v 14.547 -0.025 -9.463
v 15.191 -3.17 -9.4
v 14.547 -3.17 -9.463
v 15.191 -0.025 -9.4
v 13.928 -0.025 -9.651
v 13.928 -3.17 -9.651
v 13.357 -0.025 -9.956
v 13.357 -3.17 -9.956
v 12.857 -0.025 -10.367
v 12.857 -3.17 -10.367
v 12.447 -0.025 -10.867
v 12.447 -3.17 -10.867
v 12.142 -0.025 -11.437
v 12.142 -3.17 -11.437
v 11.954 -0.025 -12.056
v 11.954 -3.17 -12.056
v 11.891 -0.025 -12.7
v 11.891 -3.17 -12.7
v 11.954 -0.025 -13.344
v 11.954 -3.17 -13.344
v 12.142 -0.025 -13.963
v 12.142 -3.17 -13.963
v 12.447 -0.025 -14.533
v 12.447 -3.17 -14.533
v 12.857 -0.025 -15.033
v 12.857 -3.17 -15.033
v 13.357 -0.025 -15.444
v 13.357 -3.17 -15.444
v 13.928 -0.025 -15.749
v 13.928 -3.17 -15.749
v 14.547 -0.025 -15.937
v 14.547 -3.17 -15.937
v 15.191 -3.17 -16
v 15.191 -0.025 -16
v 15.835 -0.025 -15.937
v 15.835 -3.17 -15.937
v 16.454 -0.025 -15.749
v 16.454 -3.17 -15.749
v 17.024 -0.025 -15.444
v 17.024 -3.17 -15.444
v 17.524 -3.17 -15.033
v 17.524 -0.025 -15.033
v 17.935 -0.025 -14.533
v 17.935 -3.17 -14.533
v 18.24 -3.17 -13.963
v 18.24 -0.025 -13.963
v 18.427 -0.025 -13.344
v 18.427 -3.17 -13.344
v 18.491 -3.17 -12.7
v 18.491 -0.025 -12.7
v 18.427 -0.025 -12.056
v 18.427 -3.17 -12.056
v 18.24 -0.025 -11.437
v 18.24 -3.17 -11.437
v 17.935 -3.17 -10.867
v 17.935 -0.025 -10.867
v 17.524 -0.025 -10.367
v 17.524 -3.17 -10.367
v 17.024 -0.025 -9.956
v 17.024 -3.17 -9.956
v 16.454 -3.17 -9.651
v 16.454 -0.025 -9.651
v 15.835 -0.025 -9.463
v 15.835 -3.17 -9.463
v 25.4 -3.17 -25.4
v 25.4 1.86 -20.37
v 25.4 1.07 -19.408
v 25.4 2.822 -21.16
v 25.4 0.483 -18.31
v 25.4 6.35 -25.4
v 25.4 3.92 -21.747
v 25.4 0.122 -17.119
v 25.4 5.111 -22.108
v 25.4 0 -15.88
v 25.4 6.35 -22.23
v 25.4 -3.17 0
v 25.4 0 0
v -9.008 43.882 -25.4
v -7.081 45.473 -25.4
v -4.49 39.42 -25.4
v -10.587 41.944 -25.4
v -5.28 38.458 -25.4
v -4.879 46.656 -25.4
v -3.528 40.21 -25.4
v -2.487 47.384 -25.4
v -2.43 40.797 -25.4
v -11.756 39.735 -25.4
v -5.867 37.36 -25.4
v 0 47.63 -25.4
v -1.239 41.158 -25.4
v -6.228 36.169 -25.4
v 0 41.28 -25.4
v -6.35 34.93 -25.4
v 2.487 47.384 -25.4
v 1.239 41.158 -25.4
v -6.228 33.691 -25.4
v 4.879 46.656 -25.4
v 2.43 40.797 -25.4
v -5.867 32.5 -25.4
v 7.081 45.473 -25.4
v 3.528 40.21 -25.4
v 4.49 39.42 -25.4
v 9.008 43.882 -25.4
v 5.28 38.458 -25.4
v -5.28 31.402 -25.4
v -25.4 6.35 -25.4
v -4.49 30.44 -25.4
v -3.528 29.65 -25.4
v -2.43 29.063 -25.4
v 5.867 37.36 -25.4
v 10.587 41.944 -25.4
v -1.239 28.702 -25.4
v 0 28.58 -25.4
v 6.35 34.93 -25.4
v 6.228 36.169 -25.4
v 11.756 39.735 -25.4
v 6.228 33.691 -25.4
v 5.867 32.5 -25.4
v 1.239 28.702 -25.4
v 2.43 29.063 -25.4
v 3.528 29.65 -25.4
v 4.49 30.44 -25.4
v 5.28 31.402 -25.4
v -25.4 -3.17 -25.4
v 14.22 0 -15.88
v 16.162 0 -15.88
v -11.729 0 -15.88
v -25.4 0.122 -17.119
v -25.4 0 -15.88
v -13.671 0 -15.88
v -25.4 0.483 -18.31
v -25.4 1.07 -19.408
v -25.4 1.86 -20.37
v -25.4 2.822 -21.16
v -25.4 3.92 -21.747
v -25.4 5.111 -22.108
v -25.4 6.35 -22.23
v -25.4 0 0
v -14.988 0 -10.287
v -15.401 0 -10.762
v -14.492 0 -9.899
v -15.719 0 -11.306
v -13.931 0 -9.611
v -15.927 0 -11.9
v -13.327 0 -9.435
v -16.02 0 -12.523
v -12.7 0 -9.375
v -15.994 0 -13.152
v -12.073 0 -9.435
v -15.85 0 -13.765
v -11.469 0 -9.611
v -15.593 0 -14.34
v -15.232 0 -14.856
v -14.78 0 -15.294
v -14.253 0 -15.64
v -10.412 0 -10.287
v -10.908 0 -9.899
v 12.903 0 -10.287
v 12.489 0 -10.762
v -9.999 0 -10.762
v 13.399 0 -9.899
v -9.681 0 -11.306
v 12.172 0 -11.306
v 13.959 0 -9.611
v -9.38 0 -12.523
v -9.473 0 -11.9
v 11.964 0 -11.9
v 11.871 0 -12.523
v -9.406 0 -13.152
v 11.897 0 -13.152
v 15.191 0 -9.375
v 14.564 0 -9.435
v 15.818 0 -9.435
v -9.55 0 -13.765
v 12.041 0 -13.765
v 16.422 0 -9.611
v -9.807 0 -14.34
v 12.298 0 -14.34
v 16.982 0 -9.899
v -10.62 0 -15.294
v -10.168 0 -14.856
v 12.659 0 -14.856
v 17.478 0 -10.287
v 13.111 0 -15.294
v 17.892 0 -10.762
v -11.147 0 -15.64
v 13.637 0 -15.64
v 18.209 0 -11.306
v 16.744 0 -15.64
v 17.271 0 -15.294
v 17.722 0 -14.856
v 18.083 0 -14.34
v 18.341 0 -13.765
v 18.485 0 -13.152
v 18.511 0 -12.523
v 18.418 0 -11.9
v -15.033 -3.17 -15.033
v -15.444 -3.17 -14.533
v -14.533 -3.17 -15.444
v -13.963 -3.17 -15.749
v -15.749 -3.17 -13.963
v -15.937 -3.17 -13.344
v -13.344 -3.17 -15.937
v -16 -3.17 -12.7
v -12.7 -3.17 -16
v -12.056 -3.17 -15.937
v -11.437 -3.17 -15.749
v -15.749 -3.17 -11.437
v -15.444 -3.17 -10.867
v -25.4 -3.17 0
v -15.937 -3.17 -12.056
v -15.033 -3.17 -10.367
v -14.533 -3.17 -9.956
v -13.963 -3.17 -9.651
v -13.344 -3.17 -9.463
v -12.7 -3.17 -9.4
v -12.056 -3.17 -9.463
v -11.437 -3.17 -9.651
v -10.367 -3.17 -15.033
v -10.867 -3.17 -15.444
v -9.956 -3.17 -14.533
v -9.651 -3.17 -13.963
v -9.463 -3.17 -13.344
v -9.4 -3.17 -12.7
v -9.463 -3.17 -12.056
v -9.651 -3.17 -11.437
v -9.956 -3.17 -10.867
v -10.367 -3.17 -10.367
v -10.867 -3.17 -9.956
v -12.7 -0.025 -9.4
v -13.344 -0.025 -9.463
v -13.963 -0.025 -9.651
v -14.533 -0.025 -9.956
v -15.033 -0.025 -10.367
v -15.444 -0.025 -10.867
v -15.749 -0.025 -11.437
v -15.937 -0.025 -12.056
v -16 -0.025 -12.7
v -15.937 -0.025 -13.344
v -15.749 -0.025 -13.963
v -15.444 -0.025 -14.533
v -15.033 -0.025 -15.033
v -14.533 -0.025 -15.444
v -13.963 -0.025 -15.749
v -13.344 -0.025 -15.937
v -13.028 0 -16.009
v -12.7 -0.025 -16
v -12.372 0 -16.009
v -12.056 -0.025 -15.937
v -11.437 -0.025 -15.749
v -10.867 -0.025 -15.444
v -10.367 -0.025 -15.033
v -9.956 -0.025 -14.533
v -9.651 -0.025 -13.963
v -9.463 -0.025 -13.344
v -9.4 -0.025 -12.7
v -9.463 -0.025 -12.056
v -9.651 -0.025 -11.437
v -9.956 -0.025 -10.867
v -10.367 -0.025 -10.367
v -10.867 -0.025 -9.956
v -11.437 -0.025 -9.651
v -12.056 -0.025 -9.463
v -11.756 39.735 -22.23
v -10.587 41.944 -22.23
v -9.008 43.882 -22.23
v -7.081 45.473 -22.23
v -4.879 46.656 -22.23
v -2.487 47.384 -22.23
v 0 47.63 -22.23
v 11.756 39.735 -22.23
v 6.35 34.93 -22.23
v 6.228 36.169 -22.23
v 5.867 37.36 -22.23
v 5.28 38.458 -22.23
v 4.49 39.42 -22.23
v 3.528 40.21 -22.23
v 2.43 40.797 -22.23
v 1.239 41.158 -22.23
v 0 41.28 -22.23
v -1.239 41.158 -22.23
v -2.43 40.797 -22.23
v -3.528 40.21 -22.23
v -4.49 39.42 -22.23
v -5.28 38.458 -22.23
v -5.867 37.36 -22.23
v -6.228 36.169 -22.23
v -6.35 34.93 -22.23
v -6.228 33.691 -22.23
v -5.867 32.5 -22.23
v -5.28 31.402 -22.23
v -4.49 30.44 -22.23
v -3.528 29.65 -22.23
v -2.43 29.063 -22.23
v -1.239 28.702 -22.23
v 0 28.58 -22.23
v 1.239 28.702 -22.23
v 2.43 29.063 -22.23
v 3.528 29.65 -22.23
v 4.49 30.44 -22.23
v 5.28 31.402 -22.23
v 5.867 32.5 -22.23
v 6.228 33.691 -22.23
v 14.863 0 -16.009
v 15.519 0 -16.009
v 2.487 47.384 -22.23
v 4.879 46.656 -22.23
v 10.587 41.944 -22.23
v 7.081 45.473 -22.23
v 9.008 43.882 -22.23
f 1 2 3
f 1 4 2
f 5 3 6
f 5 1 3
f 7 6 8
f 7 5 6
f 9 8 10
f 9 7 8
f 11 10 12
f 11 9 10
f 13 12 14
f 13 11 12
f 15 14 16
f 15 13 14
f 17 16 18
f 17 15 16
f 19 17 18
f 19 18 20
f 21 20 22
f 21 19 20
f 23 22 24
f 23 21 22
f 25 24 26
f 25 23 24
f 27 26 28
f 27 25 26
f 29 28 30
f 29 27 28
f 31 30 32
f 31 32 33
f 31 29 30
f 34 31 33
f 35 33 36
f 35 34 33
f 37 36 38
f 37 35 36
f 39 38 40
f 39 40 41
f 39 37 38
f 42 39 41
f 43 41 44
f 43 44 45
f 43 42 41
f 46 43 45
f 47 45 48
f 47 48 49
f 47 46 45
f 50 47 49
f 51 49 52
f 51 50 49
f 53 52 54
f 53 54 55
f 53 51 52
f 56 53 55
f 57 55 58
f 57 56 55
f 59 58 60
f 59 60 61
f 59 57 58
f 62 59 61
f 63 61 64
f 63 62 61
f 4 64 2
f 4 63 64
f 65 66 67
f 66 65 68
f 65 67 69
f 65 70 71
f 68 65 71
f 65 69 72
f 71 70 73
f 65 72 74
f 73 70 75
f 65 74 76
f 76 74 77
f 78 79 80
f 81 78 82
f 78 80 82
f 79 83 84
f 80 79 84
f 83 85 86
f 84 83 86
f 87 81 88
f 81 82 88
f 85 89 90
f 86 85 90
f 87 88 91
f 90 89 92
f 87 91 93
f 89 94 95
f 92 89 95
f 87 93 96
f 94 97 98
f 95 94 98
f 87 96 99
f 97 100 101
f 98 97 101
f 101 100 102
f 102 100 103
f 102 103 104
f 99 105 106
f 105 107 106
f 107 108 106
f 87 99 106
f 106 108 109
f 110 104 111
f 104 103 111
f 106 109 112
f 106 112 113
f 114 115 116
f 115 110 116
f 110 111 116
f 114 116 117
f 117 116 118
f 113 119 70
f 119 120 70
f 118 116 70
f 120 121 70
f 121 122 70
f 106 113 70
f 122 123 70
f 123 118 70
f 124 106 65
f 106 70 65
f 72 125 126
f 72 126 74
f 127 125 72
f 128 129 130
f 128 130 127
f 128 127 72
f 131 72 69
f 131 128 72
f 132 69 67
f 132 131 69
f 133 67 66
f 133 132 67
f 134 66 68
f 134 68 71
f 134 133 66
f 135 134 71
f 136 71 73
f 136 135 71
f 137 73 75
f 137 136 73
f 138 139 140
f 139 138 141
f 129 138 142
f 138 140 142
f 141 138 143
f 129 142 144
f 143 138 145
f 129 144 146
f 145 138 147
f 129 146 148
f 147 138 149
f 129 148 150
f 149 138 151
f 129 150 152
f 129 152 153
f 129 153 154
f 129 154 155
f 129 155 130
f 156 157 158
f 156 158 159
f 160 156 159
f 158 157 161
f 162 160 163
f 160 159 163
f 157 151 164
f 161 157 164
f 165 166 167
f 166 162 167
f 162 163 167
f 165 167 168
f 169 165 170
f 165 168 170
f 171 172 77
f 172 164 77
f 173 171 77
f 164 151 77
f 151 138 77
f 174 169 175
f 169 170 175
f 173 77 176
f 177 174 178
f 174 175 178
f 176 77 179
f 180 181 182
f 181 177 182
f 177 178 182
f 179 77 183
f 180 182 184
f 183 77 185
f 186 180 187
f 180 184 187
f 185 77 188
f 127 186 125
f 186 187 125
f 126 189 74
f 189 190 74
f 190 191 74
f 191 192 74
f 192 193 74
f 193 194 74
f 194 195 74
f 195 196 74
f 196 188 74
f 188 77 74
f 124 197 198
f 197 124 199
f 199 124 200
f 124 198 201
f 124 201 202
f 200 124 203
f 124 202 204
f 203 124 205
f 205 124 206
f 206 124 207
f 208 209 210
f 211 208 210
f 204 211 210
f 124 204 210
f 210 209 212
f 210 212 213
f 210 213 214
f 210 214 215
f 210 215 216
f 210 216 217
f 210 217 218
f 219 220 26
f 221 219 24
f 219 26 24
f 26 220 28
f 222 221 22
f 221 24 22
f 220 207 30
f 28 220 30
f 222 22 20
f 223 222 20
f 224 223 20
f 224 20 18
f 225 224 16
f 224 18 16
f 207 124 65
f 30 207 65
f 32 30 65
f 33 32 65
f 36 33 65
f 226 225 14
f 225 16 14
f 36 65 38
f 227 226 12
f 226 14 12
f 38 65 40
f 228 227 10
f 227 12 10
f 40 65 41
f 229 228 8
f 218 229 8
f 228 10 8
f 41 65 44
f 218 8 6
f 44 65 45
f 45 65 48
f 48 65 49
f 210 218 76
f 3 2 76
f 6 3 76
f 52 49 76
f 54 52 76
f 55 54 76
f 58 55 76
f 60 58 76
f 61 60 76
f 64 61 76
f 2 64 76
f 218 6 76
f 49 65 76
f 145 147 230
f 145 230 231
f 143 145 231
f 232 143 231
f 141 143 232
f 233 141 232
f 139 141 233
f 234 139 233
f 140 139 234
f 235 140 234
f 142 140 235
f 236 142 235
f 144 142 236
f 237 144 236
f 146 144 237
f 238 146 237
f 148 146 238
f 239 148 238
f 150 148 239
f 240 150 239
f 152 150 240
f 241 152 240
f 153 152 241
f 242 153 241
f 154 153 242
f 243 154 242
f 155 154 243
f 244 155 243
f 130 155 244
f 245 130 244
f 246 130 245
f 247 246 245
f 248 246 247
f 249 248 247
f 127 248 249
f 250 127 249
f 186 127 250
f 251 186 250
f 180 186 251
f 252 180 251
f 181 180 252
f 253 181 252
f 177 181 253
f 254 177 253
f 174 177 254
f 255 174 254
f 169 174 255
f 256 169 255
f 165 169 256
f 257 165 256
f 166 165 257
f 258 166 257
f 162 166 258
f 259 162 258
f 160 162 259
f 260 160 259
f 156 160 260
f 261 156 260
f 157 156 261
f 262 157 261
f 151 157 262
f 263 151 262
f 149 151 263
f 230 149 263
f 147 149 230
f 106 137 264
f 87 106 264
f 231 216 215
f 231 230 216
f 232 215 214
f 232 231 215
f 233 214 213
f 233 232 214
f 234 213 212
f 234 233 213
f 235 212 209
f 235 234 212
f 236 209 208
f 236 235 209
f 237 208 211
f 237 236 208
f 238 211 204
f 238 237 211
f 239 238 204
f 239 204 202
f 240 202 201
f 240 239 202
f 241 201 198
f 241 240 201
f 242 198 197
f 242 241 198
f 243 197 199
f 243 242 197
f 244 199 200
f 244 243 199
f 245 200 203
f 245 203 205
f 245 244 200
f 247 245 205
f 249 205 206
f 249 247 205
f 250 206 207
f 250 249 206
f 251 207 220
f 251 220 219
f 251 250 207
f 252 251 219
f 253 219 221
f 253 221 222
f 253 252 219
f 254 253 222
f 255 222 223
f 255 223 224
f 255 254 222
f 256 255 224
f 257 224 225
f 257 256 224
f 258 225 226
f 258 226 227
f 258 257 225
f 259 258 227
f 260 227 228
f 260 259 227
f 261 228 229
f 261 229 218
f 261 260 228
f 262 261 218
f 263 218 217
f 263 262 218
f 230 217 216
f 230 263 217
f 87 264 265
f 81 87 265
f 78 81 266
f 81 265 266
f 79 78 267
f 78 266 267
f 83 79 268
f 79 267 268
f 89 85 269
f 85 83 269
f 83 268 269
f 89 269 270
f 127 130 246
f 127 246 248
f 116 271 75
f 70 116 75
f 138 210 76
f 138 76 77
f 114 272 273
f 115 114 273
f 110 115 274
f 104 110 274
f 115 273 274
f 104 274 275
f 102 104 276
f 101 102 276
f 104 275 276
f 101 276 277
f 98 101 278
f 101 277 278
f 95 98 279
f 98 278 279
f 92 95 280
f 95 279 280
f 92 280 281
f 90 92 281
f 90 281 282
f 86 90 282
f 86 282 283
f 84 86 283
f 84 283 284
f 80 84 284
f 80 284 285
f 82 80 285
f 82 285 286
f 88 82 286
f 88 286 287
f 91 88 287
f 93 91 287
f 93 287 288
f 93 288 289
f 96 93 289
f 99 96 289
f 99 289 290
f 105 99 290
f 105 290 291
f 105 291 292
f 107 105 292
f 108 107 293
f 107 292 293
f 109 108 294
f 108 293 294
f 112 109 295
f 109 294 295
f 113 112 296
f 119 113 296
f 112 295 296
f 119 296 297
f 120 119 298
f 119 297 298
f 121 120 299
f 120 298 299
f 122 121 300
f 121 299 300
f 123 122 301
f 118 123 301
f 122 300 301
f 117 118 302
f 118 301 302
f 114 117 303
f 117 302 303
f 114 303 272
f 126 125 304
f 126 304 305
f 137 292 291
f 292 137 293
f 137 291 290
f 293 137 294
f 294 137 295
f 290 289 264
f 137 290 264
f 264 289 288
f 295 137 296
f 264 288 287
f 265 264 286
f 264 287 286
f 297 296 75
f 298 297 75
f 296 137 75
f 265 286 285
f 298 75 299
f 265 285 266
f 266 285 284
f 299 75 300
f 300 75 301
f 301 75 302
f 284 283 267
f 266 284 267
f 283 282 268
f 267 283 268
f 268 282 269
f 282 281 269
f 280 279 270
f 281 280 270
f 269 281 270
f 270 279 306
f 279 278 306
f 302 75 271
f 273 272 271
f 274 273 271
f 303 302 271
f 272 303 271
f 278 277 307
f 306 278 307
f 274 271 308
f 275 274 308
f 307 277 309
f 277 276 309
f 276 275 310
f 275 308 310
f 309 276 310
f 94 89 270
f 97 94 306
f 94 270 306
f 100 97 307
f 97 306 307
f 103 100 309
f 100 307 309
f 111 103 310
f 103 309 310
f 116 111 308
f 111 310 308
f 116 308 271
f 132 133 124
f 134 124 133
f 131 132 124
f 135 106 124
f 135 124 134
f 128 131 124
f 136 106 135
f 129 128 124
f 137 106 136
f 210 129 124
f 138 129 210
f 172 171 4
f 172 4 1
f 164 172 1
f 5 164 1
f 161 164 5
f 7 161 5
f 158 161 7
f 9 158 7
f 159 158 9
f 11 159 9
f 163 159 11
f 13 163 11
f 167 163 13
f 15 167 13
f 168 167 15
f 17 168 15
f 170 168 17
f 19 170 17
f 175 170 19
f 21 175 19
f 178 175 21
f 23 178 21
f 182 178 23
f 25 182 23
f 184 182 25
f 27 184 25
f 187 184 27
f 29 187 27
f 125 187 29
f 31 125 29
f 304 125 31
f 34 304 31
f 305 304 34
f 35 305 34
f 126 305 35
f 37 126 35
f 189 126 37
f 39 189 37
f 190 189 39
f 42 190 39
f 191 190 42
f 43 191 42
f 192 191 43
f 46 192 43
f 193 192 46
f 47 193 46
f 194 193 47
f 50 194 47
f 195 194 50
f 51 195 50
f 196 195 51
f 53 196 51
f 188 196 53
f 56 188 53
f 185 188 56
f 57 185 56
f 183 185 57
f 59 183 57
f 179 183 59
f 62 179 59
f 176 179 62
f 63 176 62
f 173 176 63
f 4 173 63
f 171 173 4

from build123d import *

# Parameters (mm, degrees)
BOSS_EXTRUDE1_DEPTH           = 25.4
FILLET1_R                     = 6.35
M6_CLEARANCE_HOLE1_AT_2_COUNT = 2
M6_CLEARANCE_HOLE1_AT_2_PITCH = 27.890807904
SKETCH4_R                     = 6.35
CUT_EXTRUDE1_DEPTH            = 59.37764812


with BuildPart() as part:
    # Sketch1 → Boss-Extrude1 (new, symmetric)
    with BuildSketch(Plane(origin=(0, 0, 0), x_dir=(0, 0, -1), z_dir=(1, 0, 0))):
        Polygon((0, 0), (22.23, 0), (22.23, 47.63), (25.4, 47.63), (25.4, -3.17), (0, -3.17), align=None)
    extrude(amount=BOSS_EXTRUDE1_DEPTH, both=True)

    # Fillet1
    fillet1_edges = [part.edges().sort_by_distance(p)[0] for p in [
        (0, 0, -22.23),
    ]]
    fillet(fillet1_edges, radius=FILLET1_R)

    # Sketch3 → M6 Clearance Hole1 (revolve, cut)
    with BuildSketch(Plane(origin=(-12.7, 0, -12.7), x_dir=(0, 0, 1), z_dir=(1, 0, 0))):
        Polygon((0, 0), (0, 3.17), (3.3, 3.17), (3.3, 0.025), (3.325, 0), align=None)
    m6_clearance_hole1 = revolve(axis=Axis((-12.7, 6.35, -12.7), (0, -1, 0)), mode=Mode.SUBTRACT)

    # M6 Clearance Hole1 at 2: M6 Clearance Hole1 ×2
    with Locations(*[(i * M6_CLEARANCE_HOLE1_AT_2_PITCH, 0, 0) for i in range(1, M6_CLEARANCE_HOLE1_AT_2_COUNT)]):
        add(m6_clearance_hole1, mode=Mode.SUBTRACT)

    # Sketch4 → Cut-Extrude1 (cut, through all)
    with BuildSketch(Plane.XY.offset(-22.23)):
        with Locations((0, 34.93)):
            Circle(SKETCH4_R)
        with BuildLine():
            Line((25.4, 47.63), (-3e-08, 47.63))
            ThreePointArc((-3e-08, 47.63), (7.080670019, 45.472965052), (11.756103406, 39.734584552))
            Line((11.756103406, 39.734584552), (25.4, 6.35))
            Line((25.4, 6.35), (25.4, 47.63))
        make_face()
        with BuildLine():
            Line((-25.4, 47.63), (-25.4, 6.35))
            Line((-25.4, 6.35), (-11.756103406, 39.734584552))
            ThreePointArc((-11.756103406, 39.734584552), (-7.080670044, 45.472965035), (-3e-08, 47.63))
            Line((-3e-08, 47.63), (-25.4, 47.63))
        make_face()
    extrude(amount=-CUT_EXTRUDE1_DEPTH, mode=Mode.SUBTRACT)


solid = part.part
